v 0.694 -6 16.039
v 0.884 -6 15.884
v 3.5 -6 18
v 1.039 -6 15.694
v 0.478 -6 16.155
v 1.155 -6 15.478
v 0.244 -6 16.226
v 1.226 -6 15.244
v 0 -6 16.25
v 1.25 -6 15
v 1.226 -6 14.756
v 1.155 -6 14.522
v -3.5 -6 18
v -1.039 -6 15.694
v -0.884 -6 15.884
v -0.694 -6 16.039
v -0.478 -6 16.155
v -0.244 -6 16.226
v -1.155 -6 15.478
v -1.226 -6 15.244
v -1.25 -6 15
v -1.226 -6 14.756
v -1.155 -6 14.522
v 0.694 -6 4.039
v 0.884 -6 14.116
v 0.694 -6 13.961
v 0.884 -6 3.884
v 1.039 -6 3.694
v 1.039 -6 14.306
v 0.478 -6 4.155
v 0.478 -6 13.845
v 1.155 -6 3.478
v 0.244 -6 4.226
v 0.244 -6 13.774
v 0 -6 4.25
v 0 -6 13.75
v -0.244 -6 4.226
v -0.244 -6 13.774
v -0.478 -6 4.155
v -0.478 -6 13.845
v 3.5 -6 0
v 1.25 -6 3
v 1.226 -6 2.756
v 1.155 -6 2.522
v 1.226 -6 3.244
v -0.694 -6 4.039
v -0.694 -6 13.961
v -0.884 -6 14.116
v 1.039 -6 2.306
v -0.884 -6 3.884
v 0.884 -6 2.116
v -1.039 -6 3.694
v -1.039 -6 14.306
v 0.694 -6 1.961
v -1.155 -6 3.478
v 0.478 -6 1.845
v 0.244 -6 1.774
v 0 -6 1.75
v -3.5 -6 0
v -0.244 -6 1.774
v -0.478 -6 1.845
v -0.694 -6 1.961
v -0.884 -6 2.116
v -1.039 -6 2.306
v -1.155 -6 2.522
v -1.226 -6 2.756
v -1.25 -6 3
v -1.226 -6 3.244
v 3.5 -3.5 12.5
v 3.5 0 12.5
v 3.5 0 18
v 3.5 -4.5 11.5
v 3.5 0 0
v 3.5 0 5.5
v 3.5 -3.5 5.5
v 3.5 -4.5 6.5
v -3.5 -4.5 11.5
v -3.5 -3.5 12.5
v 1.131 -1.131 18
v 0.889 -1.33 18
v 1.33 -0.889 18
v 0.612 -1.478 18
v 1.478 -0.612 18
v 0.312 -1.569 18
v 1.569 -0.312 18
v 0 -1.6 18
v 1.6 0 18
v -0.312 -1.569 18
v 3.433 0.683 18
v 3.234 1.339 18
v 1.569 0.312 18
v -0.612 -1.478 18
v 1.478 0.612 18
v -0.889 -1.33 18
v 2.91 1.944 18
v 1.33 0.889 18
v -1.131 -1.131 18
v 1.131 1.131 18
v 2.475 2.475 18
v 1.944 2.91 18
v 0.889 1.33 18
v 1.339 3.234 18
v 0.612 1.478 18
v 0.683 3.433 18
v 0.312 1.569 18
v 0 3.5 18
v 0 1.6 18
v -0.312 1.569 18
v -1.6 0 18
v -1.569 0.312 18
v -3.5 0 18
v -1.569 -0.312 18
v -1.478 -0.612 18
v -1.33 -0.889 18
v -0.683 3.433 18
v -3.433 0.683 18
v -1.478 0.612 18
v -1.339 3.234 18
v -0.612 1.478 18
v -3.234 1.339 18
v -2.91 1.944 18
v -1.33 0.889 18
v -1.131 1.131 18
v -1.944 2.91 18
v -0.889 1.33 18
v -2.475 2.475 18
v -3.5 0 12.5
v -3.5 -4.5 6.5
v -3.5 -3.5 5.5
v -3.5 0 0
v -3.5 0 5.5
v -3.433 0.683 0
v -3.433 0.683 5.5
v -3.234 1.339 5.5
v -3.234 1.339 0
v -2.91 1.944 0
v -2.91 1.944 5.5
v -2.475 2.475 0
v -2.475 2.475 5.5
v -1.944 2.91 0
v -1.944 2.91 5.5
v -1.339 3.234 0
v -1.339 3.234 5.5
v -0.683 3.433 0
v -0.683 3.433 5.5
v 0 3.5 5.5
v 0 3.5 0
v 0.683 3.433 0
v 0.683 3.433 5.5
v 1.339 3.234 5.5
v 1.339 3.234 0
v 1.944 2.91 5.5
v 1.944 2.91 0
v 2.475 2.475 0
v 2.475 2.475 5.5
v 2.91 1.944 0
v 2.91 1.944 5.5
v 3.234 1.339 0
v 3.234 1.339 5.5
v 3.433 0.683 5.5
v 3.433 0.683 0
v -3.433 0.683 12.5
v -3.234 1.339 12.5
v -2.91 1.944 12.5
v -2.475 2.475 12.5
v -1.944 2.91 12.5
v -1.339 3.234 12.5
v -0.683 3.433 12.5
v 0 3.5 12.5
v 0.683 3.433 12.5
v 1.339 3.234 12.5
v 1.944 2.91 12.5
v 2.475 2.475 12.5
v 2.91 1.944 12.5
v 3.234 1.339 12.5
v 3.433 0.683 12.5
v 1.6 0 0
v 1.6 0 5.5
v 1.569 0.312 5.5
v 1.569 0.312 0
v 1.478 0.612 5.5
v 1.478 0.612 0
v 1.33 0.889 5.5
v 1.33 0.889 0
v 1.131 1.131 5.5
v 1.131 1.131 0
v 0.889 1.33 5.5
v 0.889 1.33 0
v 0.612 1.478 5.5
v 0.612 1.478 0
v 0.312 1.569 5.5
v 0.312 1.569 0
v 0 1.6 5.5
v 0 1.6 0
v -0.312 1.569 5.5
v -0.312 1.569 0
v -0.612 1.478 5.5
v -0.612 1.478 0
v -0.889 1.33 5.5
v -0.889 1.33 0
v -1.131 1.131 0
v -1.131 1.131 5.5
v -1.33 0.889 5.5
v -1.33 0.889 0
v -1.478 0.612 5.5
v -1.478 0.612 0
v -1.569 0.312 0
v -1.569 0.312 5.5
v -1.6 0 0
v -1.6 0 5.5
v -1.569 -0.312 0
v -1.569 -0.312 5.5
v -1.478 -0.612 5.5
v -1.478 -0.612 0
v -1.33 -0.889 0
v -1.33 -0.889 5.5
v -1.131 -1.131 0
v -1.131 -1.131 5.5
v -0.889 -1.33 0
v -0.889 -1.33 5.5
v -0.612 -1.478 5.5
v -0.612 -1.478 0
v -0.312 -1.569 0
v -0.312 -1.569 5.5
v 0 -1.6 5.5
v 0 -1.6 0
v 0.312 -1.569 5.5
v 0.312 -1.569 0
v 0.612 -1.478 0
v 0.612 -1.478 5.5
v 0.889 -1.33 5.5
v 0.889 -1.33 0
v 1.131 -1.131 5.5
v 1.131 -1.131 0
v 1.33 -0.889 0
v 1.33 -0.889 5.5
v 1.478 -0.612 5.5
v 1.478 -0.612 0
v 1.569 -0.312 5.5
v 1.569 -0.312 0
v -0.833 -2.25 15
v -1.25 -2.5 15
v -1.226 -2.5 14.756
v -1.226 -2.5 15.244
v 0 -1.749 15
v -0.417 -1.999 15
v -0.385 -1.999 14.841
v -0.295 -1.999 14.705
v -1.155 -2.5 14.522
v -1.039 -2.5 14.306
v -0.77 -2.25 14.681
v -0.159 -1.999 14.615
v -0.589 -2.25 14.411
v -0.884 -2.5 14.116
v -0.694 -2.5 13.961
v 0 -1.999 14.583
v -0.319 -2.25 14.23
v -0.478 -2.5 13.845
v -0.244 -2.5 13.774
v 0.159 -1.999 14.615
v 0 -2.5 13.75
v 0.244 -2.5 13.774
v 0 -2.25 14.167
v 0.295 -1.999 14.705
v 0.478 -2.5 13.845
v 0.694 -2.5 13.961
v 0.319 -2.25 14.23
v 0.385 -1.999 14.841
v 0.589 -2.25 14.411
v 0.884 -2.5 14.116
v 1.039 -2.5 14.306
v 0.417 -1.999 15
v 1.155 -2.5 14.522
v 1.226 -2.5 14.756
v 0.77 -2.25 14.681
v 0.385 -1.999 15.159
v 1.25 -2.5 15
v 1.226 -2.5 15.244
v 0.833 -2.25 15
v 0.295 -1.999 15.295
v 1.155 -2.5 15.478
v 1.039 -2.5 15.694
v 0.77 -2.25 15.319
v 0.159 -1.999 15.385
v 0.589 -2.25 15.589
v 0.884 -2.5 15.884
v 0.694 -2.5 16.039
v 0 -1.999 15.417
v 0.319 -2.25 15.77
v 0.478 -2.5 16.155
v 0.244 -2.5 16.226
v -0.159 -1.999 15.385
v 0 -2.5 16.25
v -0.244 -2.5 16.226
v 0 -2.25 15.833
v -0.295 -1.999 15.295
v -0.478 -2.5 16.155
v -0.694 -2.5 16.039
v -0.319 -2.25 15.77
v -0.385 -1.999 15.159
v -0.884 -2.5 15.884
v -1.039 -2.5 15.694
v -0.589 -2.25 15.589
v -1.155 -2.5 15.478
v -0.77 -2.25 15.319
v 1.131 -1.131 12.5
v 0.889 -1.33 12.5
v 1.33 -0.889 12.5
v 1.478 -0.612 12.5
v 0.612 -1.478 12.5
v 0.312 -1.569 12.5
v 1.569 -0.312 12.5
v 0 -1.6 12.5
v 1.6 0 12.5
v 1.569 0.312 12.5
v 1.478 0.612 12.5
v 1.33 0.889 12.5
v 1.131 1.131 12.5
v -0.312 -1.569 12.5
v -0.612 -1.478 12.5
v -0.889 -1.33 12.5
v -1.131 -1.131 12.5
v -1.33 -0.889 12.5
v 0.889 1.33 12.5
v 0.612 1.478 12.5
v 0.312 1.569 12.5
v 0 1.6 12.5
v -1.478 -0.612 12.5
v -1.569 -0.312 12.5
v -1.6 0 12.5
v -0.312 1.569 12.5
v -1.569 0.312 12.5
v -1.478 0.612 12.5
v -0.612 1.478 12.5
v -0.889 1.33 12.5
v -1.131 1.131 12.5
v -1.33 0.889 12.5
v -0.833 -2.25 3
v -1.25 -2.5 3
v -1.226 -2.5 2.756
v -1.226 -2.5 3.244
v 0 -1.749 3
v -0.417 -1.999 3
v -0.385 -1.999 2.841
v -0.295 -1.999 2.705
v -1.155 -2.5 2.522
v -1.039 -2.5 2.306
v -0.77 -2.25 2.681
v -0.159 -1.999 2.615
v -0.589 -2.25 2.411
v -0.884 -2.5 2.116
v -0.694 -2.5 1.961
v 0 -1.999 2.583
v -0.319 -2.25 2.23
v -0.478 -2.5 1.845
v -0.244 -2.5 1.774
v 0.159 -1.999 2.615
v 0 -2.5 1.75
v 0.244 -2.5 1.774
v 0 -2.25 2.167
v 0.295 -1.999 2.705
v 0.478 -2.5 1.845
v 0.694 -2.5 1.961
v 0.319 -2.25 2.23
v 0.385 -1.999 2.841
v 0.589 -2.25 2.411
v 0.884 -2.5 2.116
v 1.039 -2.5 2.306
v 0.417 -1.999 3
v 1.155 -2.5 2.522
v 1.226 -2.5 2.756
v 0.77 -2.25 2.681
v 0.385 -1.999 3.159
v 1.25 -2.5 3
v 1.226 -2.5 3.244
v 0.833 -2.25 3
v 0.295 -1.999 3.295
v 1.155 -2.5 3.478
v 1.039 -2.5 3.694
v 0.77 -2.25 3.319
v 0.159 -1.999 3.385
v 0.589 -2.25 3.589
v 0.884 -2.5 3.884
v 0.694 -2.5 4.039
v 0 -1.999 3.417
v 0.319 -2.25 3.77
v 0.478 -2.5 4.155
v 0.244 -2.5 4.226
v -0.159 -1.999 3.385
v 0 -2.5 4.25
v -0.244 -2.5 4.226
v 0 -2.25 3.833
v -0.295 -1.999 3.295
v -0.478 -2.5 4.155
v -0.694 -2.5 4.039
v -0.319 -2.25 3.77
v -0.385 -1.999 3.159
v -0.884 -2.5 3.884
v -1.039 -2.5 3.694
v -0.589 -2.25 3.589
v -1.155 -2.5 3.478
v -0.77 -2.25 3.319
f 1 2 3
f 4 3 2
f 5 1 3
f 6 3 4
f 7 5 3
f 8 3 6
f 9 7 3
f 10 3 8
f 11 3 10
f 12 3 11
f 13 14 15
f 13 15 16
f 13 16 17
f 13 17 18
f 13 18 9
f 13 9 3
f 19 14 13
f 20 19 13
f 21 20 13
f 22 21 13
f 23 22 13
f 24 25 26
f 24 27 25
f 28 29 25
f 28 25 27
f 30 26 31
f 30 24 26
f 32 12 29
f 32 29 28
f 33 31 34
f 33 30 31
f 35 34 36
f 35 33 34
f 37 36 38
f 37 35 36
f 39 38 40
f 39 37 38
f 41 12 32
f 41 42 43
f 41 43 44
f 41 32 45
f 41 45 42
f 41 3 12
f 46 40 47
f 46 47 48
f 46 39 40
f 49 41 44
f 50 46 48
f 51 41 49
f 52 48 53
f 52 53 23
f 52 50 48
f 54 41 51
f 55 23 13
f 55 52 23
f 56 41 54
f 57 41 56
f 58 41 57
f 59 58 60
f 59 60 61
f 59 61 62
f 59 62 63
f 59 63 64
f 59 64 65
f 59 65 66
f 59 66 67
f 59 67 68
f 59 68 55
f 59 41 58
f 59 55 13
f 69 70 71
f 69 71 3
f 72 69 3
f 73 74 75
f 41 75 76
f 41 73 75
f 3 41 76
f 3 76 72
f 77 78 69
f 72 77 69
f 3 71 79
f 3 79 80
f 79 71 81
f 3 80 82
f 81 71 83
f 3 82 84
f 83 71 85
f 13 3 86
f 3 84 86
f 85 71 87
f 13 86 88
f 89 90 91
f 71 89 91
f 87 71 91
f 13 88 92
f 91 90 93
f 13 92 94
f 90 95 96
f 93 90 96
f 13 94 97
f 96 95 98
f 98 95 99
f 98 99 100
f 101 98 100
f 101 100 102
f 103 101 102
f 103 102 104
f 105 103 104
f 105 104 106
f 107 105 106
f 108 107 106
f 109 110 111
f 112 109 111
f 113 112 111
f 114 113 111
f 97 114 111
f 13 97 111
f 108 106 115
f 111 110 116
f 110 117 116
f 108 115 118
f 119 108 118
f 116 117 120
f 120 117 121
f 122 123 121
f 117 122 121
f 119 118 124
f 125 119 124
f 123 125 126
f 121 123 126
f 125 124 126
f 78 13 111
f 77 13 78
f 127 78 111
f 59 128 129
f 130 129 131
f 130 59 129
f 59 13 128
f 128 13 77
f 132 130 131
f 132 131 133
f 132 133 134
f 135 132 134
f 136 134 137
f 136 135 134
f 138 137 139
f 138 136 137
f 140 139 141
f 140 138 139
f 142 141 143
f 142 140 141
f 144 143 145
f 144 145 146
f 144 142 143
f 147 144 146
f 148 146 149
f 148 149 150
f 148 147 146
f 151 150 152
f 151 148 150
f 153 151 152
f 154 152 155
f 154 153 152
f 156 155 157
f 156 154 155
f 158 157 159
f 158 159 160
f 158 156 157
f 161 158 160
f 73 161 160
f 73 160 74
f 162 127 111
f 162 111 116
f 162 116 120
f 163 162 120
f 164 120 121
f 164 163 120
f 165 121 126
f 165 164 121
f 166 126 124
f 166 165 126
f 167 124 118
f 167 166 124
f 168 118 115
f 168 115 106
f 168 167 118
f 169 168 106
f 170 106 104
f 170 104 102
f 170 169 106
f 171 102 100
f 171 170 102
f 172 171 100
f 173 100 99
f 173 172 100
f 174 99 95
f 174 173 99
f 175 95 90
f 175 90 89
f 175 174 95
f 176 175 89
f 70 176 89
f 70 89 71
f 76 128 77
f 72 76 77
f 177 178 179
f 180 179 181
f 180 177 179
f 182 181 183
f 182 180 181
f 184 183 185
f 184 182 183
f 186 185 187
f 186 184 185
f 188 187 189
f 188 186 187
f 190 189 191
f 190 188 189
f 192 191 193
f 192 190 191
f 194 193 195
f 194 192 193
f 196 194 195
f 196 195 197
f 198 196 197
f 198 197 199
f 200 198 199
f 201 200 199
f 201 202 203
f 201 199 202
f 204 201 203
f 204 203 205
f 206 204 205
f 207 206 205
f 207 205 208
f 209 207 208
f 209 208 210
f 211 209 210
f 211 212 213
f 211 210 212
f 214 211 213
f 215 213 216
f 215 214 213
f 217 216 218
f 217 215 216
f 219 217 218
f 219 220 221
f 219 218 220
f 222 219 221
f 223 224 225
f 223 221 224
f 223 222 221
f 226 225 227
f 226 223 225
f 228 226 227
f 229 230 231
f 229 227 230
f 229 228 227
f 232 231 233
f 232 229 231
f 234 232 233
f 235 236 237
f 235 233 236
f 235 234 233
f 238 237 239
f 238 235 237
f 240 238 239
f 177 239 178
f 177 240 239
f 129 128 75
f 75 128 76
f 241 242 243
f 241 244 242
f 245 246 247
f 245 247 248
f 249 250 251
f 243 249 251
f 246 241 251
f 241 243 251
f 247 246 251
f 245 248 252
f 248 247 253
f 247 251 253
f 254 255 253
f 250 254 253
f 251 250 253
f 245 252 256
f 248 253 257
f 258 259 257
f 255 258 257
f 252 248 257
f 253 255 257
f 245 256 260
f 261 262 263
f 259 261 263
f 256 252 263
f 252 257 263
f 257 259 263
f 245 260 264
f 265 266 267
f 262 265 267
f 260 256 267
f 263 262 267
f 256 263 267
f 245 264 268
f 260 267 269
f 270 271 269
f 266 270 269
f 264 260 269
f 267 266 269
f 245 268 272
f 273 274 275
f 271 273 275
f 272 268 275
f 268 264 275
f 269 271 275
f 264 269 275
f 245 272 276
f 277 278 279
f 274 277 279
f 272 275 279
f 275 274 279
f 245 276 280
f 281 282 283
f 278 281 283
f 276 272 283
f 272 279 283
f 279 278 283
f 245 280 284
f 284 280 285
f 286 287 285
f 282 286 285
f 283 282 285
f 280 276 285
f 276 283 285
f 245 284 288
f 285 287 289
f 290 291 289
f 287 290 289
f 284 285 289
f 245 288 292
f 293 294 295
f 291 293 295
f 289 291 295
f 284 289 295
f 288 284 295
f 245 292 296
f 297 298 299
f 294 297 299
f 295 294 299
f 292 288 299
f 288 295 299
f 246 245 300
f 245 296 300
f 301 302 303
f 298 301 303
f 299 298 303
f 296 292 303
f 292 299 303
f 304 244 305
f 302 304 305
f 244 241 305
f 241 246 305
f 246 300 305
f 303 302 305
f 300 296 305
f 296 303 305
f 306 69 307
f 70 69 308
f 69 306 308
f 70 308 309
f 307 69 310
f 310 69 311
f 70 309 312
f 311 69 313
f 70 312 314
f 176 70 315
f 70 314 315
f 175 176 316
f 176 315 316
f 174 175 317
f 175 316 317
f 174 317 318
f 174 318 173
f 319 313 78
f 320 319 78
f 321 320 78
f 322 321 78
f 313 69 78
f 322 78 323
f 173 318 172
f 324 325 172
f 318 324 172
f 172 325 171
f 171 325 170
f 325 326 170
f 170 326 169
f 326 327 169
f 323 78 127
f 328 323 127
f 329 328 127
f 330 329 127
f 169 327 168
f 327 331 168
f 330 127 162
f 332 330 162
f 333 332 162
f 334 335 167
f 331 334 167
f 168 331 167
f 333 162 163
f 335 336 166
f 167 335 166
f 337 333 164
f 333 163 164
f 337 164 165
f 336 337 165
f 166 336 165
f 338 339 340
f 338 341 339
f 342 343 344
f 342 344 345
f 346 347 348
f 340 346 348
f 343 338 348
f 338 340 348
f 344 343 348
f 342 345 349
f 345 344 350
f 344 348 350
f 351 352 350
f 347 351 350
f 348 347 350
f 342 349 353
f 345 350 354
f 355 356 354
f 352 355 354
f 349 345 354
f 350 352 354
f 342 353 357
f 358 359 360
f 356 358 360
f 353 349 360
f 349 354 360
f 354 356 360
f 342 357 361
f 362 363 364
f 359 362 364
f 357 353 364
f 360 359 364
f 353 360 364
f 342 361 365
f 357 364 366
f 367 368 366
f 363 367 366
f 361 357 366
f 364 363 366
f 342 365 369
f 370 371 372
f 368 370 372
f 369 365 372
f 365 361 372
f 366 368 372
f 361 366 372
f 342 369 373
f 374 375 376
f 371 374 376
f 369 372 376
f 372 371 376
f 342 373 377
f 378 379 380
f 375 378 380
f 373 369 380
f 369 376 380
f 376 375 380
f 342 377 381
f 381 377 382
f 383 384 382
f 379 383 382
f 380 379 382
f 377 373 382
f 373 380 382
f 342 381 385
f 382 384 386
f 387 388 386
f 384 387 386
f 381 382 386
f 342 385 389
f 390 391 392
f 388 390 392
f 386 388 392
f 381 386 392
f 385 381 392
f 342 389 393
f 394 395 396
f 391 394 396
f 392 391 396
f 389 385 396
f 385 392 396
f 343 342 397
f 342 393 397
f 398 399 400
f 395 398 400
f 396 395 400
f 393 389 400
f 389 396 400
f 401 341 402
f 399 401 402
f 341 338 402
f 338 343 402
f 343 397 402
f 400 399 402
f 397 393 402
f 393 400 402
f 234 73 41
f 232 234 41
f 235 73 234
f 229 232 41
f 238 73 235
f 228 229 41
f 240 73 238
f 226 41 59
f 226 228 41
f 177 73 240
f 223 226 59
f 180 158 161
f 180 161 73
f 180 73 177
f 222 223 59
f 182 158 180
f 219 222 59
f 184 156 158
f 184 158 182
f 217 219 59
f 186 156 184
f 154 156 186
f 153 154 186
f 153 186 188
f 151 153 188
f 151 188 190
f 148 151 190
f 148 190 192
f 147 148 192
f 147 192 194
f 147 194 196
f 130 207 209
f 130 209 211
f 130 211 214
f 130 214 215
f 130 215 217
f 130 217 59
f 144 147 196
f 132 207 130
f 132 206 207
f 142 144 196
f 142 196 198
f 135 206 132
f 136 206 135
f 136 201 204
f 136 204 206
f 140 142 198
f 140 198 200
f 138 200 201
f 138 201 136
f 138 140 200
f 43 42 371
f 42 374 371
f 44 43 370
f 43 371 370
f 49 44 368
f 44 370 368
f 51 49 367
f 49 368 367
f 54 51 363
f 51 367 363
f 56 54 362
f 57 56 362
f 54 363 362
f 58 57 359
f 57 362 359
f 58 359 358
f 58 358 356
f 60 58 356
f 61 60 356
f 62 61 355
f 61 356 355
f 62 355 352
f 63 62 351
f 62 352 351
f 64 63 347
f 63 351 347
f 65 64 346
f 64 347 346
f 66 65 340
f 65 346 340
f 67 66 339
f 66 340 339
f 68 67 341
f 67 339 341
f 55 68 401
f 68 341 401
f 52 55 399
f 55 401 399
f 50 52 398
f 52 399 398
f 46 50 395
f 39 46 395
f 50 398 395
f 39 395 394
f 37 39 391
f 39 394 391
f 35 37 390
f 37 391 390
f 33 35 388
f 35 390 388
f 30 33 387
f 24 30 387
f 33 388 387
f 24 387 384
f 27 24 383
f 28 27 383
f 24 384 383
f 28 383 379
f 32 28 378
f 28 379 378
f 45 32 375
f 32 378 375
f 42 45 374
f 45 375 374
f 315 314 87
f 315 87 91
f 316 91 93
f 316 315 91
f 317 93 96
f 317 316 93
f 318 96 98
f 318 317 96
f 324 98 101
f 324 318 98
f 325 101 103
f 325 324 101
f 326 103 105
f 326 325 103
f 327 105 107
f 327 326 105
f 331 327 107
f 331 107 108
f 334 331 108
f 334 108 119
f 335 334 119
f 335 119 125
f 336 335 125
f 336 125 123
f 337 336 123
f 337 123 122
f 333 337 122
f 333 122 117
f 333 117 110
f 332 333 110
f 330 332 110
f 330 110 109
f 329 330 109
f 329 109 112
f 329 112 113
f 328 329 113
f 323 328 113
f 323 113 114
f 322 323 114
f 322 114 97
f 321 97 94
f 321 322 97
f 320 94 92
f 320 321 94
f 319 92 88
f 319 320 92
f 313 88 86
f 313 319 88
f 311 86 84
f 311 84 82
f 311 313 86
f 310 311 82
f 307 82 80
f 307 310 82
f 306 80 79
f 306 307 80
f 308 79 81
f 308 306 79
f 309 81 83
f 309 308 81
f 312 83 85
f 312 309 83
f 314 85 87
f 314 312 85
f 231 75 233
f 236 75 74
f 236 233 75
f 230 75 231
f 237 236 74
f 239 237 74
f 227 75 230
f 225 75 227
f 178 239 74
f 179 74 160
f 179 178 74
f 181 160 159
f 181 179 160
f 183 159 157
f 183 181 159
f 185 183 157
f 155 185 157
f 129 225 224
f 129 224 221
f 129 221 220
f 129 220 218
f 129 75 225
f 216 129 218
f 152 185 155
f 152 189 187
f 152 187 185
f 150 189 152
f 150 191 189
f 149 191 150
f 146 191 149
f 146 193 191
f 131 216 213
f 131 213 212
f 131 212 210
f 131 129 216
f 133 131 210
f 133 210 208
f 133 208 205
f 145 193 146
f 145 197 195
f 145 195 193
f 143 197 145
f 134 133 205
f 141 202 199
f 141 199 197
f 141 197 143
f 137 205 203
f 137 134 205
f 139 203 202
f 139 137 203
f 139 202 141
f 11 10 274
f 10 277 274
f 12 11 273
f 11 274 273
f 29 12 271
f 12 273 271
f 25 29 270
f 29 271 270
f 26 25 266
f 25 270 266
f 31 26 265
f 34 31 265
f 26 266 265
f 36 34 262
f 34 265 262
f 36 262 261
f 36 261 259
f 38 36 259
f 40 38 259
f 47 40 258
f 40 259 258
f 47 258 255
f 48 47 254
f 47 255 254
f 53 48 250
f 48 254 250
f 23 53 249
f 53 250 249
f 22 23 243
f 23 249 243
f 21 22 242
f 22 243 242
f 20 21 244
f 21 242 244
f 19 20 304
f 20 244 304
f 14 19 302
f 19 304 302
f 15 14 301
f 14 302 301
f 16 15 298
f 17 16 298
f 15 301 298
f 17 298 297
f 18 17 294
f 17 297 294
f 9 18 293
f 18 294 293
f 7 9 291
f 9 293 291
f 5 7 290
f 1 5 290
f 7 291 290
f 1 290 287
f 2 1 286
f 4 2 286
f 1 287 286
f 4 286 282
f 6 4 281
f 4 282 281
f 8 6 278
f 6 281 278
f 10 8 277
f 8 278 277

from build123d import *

# Parameters (mm, degrees)
SKETCH_1_R             = 1.6
EXTRUDE_1_DEPTH        = 18
SKETCH_3_W             = 7
SKETCH_3_H             = 11.399287815
CUT_EXTRUDE_2_DEPTH    = 21.223748416
HOLE_WIZARD_M3_1_D     = 2.5
HOLE_WIZARD_M3_1_DEPTH = 3.5
HOLE_WIZARD_M3_1_TIP   = 0.751075774
CHAMFER_1_SIZE         = 1


with BuildPart() as part:
    # 草图1 → 凸台-拉伸1 (new body)
    with BuildSketch(Plane.XY):
        with BuildLine():
            Line((-3.5, -6), (-3.5, 0))
            ThreePointArc((-3.5, 0), (0, 3.5), (3.5, 0))
            Line((3.5, 0), (3.5, -6))
            Line((3.5, -6), (-3.5, -6))
        make_face()
        Circle(SKETCH_1_R, mode=Mode.SUBTRACT)
    extrude(amount=EXTRUDE_1_DEPTH)

    # 草图3 → 切除-拉伸2 (cut, through all)
    with BuildSketch(Plane.ZY.offset(3.5)):
        with Locations((9, 1.199643908)):
            Rectangle(SKETCH_3_W, SKETCH_3_H)
    extrude(amount=-CUT_EXTRUDE_2_DEPTH, mode=Mode.SUBTRACT)

    # M3 螺纹孔1
    with Locations(Plane(origin=(0, -6, 0), x_dir=(-1, 0, 0), z_dir=(0, -1, 0))):
        with Locations((0, -3), (0, -15)):
            Hole(HOLE_WIZARD_M3_1_D / 2, depth=HOLE_WIZARD_M3_1_DEPTH)
            with Locations((0, 0, -(HOLE_WIZARD_M3_1_DEPTH + HOLE_WIZARD_M3_1_TIP / 2))):  # 118° drill point
                Cone(0, HOLE_WIZARD_M3_1_D / 2, HOLE_WIZARD_M3_1_TIP, mode=Mode.SUBTRACT)

    # 倒角1
    chamfer_1_edges = [part.edges().sort_by_distance(p)[0] for p in [
        (0, -4.5, 5.5),
        (0, -4.5, 12.5),
    ]]
    chamfer(chamfer_1_edges, length=CHAMFER_1_SIZE)


solid = part.part
